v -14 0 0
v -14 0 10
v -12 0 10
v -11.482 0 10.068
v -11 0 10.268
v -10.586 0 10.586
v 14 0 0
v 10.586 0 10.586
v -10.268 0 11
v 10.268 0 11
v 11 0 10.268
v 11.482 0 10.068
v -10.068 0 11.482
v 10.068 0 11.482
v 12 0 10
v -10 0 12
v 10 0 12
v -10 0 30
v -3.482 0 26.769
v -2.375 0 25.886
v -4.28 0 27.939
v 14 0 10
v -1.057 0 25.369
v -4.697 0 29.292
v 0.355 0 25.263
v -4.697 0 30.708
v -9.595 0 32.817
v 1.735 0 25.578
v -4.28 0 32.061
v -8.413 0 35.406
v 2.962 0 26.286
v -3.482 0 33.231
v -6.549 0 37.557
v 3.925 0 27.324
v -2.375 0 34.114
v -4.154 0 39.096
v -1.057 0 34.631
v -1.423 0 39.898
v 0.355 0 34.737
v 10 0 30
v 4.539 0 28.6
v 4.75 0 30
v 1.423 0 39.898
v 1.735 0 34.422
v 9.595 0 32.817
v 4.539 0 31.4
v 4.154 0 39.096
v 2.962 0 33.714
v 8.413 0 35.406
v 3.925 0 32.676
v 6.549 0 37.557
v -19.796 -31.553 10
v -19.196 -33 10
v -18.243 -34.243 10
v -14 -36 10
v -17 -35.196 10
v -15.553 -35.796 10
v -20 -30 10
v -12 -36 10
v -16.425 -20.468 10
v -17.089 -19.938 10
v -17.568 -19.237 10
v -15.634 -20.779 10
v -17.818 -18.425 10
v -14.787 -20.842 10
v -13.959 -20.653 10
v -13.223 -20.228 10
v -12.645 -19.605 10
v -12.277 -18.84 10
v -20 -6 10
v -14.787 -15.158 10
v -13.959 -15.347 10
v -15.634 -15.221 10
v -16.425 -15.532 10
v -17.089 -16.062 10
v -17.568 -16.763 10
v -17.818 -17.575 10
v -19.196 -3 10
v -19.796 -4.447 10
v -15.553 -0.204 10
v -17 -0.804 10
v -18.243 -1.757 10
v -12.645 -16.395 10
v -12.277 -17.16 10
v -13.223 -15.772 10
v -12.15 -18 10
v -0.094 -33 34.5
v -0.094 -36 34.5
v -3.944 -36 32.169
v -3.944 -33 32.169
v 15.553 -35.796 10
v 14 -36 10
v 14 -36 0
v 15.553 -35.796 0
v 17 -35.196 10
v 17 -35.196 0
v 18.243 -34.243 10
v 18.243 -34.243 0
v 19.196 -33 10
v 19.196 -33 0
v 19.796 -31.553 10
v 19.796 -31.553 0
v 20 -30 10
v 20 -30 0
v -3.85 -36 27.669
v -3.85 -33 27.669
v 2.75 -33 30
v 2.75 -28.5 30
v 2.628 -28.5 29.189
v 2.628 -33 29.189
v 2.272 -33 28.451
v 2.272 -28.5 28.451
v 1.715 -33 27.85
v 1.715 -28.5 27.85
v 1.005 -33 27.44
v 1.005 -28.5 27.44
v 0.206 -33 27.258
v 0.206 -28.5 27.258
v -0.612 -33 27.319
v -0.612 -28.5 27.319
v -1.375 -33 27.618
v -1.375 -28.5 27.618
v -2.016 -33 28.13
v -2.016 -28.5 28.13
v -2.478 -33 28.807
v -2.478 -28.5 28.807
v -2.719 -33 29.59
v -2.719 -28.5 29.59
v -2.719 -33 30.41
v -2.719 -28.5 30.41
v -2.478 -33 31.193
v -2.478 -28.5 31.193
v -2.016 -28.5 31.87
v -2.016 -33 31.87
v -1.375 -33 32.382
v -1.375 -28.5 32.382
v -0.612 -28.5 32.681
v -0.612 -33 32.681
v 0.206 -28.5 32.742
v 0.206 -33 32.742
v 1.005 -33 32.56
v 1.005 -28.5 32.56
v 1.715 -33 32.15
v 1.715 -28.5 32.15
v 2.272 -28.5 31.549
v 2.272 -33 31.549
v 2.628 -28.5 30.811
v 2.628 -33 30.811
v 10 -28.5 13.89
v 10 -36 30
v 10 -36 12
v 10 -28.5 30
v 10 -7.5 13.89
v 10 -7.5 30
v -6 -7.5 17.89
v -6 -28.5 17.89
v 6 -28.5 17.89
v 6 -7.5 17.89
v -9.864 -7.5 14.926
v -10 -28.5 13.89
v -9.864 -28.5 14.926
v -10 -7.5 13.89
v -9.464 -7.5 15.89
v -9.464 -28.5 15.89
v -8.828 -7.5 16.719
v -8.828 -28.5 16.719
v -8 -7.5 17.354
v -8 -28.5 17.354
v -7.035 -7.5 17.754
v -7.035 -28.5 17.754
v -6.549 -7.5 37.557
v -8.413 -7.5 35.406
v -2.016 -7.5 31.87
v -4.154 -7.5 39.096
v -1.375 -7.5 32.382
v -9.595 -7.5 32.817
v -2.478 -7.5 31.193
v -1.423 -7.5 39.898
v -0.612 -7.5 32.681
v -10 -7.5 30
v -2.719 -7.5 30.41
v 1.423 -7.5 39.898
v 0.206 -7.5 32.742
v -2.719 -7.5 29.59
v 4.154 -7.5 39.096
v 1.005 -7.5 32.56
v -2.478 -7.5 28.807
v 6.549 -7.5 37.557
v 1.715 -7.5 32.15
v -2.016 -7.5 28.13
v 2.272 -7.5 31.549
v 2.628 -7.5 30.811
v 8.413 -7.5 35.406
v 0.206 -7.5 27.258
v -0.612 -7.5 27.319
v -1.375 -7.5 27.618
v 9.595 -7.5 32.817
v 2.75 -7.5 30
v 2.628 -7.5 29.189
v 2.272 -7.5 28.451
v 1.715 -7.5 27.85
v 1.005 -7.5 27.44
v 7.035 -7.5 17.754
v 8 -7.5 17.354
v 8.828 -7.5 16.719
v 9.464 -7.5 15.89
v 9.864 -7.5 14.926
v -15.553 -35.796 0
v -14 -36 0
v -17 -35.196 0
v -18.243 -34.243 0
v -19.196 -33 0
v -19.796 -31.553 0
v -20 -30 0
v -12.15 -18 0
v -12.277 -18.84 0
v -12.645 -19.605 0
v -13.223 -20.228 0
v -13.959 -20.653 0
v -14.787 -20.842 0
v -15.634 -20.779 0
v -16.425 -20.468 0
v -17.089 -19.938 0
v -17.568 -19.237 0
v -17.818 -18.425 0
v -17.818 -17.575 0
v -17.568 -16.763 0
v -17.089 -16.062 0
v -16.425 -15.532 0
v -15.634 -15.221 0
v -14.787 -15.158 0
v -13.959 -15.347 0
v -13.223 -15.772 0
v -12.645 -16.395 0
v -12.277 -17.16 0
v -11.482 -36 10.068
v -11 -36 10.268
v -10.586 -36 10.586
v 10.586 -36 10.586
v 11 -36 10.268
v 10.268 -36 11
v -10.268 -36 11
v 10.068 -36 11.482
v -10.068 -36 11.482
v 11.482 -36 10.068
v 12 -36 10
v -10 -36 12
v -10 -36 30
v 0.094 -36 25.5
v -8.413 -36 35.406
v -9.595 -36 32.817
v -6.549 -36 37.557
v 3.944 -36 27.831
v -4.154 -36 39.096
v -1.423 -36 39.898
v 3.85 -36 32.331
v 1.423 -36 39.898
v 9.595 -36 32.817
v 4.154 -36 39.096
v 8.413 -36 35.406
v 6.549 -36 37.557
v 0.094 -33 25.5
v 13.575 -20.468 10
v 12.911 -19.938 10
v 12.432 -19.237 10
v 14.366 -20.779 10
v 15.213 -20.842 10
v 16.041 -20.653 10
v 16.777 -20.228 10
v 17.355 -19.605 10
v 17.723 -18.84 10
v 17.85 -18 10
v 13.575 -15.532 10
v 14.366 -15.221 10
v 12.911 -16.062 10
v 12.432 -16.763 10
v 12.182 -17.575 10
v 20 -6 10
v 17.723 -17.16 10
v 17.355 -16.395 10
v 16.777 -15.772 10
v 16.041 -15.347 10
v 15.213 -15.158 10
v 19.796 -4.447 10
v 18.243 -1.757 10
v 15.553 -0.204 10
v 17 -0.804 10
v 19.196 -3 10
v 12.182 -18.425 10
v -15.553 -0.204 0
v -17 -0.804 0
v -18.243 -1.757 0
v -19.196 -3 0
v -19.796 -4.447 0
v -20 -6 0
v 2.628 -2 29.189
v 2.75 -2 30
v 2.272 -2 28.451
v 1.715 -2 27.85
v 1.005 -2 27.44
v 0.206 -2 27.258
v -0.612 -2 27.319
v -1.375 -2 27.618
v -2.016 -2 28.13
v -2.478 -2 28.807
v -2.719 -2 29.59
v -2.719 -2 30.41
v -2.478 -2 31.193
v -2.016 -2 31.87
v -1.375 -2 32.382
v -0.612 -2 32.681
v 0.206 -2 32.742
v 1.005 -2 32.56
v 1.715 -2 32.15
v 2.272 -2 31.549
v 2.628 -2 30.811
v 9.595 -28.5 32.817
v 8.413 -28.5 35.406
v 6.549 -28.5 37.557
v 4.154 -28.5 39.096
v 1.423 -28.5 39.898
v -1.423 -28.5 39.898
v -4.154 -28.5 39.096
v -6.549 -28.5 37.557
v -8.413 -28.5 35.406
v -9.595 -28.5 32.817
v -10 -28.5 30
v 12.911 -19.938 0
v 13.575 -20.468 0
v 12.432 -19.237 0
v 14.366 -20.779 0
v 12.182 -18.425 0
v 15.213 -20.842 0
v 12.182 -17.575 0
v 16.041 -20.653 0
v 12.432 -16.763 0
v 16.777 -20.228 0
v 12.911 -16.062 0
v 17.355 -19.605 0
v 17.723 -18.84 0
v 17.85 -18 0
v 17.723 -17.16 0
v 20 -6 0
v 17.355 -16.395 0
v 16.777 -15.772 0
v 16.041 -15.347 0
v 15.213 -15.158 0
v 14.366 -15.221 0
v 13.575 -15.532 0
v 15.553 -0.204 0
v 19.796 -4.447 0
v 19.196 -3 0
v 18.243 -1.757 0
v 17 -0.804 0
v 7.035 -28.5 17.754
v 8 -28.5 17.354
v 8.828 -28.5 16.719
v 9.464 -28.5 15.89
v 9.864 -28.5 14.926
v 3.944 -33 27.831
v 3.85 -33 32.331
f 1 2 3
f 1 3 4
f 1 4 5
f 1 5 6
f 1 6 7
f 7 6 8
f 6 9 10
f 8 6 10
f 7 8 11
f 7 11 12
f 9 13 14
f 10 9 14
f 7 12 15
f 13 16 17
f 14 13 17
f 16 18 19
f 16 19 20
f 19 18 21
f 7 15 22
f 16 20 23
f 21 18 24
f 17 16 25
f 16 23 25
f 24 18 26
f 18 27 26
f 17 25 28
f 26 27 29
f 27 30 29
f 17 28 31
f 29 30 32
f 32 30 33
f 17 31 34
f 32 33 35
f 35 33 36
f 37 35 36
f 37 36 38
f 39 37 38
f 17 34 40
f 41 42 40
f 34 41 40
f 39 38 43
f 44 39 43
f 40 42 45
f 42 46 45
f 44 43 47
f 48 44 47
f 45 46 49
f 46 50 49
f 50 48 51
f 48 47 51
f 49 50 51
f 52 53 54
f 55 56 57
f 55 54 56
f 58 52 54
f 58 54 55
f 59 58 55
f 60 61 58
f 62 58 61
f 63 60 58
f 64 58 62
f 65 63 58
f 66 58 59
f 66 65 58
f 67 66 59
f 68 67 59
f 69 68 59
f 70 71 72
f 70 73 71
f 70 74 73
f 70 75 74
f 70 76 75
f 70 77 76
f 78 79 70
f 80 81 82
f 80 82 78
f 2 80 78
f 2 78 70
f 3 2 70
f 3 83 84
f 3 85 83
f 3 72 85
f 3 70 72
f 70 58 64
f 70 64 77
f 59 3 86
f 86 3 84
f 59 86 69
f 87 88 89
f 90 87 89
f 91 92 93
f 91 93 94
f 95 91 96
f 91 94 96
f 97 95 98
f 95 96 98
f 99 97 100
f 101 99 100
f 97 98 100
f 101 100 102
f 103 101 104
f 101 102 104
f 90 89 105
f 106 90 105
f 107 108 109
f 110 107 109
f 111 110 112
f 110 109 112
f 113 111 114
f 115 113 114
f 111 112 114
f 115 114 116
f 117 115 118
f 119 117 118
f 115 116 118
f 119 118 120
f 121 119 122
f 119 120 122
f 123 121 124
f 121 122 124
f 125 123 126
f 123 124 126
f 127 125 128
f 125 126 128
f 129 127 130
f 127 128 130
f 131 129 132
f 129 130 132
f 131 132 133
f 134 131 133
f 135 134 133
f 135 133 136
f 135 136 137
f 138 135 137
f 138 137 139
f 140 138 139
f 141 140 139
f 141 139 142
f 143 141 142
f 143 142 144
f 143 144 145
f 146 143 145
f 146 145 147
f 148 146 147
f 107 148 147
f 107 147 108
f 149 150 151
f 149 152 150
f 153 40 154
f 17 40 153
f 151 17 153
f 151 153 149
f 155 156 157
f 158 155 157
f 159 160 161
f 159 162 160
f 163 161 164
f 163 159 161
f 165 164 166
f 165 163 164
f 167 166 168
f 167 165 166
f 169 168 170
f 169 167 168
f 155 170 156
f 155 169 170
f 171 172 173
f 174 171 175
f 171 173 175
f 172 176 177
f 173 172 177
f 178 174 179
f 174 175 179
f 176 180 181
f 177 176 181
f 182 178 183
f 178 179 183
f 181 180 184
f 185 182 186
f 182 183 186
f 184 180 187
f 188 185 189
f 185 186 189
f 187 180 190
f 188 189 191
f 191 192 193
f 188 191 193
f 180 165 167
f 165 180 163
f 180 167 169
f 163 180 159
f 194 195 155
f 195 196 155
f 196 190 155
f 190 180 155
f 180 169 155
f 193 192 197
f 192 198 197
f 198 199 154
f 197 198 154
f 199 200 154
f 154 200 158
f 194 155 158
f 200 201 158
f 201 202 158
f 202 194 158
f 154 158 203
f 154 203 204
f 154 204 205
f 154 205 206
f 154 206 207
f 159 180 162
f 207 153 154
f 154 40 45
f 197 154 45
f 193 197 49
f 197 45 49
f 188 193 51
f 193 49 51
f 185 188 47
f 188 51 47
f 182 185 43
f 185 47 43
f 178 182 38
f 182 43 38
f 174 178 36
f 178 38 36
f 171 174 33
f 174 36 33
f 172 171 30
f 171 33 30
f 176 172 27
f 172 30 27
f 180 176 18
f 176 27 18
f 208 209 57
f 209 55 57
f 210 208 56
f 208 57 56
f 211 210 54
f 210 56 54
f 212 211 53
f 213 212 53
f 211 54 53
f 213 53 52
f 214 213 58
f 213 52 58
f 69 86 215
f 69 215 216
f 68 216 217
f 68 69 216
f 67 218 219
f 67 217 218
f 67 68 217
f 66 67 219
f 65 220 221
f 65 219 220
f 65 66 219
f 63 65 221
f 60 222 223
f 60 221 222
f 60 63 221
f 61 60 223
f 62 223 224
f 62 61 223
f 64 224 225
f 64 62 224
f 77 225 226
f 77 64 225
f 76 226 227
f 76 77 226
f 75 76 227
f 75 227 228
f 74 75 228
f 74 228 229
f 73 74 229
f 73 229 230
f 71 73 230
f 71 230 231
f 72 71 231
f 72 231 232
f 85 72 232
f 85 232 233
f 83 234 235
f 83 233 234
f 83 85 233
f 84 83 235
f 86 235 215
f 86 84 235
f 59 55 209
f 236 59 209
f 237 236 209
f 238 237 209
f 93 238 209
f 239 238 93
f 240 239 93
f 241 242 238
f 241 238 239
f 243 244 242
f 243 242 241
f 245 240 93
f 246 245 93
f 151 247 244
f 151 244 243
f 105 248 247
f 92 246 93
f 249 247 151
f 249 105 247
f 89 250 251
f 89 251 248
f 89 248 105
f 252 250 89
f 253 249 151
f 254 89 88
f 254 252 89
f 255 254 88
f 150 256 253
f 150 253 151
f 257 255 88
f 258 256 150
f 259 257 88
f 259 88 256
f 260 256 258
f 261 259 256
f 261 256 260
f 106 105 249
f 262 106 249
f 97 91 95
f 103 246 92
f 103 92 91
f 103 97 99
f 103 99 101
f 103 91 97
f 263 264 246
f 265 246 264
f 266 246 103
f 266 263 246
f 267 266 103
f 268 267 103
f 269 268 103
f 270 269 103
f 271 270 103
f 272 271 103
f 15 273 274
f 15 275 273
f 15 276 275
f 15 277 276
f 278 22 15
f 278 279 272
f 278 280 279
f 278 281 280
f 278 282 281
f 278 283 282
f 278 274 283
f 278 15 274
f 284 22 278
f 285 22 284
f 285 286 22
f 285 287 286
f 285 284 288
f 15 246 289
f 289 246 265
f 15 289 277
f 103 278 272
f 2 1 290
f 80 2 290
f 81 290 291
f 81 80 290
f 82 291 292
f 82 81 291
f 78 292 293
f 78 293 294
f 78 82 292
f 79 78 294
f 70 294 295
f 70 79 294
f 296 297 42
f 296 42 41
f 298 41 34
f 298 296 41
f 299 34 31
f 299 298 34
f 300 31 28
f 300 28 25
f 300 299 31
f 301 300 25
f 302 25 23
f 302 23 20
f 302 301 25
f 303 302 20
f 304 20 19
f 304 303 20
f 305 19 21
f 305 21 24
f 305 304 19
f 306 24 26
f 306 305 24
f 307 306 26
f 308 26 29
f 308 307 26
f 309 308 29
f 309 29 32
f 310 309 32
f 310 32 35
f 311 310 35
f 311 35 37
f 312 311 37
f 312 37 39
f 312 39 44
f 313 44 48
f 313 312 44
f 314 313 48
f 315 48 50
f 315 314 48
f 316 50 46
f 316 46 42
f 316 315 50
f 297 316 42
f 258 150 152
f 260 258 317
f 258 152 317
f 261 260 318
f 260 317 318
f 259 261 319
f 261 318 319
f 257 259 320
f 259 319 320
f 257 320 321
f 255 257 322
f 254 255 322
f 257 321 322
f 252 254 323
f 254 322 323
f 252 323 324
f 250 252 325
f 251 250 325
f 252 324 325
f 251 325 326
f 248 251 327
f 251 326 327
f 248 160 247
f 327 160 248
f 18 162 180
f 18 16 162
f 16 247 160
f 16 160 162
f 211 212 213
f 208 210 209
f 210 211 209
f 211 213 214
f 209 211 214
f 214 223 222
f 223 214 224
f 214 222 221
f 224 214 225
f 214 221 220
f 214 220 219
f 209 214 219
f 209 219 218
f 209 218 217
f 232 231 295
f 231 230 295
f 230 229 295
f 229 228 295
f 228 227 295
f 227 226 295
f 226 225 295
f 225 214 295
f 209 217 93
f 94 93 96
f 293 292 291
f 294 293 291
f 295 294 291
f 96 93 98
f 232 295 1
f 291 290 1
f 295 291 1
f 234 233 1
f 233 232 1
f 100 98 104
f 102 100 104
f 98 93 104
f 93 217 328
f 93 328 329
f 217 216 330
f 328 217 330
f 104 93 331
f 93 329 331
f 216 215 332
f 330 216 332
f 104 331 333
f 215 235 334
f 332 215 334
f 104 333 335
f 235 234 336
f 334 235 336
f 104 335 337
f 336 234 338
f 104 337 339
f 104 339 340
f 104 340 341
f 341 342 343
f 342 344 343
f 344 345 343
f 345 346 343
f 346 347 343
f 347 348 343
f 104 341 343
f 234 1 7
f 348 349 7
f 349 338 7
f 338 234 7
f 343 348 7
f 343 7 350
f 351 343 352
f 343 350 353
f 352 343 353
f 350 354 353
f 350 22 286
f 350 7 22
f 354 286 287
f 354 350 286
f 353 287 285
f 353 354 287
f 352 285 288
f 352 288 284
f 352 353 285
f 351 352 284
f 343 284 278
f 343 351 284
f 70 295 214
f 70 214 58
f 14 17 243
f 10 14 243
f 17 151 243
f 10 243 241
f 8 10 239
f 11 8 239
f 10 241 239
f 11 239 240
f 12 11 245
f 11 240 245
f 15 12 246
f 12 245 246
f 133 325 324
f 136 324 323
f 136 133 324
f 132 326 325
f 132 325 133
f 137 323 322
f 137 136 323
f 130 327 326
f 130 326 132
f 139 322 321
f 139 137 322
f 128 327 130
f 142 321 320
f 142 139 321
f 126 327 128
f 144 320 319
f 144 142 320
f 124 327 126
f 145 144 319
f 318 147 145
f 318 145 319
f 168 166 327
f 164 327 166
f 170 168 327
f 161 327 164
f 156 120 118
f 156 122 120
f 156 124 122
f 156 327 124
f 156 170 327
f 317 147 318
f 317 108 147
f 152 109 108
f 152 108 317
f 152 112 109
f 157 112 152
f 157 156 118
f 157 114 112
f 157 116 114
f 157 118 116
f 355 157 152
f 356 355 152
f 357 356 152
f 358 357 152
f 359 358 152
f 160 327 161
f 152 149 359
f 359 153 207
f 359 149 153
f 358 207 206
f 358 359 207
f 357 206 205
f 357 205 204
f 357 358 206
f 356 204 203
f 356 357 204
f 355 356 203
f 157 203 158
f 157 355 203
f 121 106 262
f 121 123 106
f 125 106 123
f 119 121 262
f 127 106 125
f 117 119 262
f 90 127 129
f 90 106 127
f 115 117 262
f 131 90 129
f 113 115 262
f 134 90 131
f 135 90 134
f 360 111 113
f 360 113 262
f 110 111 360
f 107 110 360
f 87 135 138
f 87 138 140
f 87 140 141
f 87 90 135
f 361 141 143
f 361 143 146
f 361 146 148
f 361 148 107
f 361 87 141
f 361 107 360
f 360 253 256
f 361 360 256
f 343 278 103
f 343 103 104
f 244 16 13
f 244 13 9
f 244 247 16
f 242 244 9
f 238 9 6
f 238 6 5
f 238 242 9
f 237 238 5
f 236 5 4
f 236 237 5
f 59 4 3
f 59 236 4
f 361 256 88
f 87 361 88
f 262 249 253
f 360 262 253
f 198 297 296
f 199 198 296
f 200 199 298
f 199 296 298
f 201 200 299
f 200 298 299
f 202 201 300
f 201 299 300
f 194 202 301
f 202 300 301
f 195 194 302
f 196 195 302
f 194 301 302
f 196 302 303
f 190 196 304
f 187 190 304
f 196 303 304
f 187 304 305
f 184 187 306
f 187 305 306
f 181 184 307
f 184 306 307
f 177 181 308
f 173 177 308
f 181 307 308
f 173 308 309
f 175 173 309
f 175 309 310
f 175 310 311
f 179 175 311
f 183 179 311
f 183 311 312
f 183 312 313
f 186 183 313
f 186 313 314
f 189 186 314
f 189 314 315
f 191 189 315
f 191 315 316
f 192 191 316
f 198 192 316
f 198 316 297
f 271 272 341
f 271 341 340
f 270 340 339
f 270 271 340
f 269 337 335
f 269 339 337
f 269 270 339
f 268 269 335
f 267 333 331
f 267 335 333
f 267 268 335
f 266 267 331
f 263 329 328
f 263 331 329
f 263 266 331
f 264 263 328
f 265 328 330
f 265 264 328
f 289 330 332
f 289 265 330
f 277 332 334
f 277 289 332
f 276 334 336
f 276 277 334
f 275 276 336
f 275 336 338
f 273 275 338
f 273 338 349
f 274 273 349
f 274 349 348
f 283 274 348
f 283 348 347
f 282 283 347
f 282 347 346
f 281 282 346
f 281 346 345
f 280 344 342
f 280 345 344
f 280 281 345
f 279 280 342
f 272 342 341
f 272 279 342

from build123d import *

# Parameters (mm, degrees)
PAD_DEPTH       = 36
SKETCH001_W     = 41.77589
SKETCH001_H     = 44.999783
POCKET_DEPTH    = 10.5
SKETCH002_R     = 2.75
POCKET001_DEPTH = 36.001
FILLET_R        = 4
FILLET001_R     = 2
SKETCH003_R     = 2.85
HOLE_DEPTH      = 16.001
FILLET002_R     = 6
CHAMFER_SIZE    = 2
POCKET002_DEPTH = 3


with BuildPart() as part:
    # Sketch → Pad (new body)
    with BuildSketch(Plane.XZ):
        with BuildLine():
            Line((-20, 0), (20, 0))
            Line((20, 10), (20, 0))
            Line((10, 10), (20, 10))
            Line((10, 30), (10, 10))
            ThreePointArc((10, 30), (0, 40), (-10, 30))
            Line((-10, 10), (-10, 30))
            Line((-20, 10), (-10, 10))
            Line((-20, 0), (-20, 10))
        make_face()
    extrude(amount=PAD_DEPTH)

    # Sketch001 (on DatumPlane) → Pocket (cut, symmetric)
    with BuildSketch(Plane(origin=(0, -18, 0), x_dir=(1, 0, 0), z_dir=(0, 1, 0))):
        with Locations((0.131337, -40.390176)):
            Rectangle(SKETCH001_W, SKETCH001_H)
    extrude(amount=POCKET_DEPTH, both=True, mode=Mode.SUBTRACT)

    # Sketch002 (on Face4 of Pocket) → Pocket001 (cut, through all)
    with BuildSketch(Plane(origin=(0, 0, 0), x_dir=(1, 0, 0), z_dir=(0, 1, 0))):
        with Locations((0, -30)):
            Circle(SKETCH002_R)
    extrude(amount=-POCKET001_DEPTH, mode=Mode.SUBTRACT)

    # Fillet
    fillet_edges = [part.edges().sort_by_distance(p)[0] for p in [
        (10, -18, 17.890285),
        (-10, -18, 17.890285),
    ]]
    fillet(fillet_edges, radius=FILLET_R)

    # Fillet001
    fillet001_edges = [part.edges().sort_by_distance(p)[0] for p in [
        (10, -18, 10),
        (-10, -18, 10),
    ]]
    fillet(fillet001_edges, radius=FILLET001_R)

    # Sketch003 (on DatumPlane) → Hole (cut, through all)
    with BuildSketch(Plane(origin=(0, 0, 16), x_dir=(1, 0, 0), z_dir=(0, 0, -1))):
        with Locations((15, 18)):
            Circle(SKETCH003_R)
        with Locations((-15, 18)):
            Circle(SKETCH003_R)
    extrude(amount=HOLE_DEPTH, mode=Mode.SUBTRACT)

    # Fillet002
    fillet002_edges = [part.edges().sort_by_distance(p)[0] for p in [
        (20, 0, 5),
        (-20, 0, 5),
        (-20, -36, 5),
        (20, -36, 5),
    ]]
    fillet(fillet002_edges, radius=FILLET002_R)

    # Chamfer
    chamfer_edges = [part.edges().sort_by_distance(p)[0] for p in [
        (-2.75, 0, 30),
    ]]
    chamfer(chamfer_edges, length=CHAMFER_SIZE)

    # Sketch004 (on Face15 of Chamfer) → Pocket002 (cut)
    with BuildSketch(Plane.XZ.offset(36)):
        Polygon((-0.093793, 34.5), (-3.944011, 32.168773), (-3.850218, 27.668773), (0.093793, 25.5), (3.944011, 27.831227), (3.850218, 32.331227), align=None)
    extrude(amount=-POCKET002_DEPTH, mode=Mode.SUBTRACT)


solid = part.part
